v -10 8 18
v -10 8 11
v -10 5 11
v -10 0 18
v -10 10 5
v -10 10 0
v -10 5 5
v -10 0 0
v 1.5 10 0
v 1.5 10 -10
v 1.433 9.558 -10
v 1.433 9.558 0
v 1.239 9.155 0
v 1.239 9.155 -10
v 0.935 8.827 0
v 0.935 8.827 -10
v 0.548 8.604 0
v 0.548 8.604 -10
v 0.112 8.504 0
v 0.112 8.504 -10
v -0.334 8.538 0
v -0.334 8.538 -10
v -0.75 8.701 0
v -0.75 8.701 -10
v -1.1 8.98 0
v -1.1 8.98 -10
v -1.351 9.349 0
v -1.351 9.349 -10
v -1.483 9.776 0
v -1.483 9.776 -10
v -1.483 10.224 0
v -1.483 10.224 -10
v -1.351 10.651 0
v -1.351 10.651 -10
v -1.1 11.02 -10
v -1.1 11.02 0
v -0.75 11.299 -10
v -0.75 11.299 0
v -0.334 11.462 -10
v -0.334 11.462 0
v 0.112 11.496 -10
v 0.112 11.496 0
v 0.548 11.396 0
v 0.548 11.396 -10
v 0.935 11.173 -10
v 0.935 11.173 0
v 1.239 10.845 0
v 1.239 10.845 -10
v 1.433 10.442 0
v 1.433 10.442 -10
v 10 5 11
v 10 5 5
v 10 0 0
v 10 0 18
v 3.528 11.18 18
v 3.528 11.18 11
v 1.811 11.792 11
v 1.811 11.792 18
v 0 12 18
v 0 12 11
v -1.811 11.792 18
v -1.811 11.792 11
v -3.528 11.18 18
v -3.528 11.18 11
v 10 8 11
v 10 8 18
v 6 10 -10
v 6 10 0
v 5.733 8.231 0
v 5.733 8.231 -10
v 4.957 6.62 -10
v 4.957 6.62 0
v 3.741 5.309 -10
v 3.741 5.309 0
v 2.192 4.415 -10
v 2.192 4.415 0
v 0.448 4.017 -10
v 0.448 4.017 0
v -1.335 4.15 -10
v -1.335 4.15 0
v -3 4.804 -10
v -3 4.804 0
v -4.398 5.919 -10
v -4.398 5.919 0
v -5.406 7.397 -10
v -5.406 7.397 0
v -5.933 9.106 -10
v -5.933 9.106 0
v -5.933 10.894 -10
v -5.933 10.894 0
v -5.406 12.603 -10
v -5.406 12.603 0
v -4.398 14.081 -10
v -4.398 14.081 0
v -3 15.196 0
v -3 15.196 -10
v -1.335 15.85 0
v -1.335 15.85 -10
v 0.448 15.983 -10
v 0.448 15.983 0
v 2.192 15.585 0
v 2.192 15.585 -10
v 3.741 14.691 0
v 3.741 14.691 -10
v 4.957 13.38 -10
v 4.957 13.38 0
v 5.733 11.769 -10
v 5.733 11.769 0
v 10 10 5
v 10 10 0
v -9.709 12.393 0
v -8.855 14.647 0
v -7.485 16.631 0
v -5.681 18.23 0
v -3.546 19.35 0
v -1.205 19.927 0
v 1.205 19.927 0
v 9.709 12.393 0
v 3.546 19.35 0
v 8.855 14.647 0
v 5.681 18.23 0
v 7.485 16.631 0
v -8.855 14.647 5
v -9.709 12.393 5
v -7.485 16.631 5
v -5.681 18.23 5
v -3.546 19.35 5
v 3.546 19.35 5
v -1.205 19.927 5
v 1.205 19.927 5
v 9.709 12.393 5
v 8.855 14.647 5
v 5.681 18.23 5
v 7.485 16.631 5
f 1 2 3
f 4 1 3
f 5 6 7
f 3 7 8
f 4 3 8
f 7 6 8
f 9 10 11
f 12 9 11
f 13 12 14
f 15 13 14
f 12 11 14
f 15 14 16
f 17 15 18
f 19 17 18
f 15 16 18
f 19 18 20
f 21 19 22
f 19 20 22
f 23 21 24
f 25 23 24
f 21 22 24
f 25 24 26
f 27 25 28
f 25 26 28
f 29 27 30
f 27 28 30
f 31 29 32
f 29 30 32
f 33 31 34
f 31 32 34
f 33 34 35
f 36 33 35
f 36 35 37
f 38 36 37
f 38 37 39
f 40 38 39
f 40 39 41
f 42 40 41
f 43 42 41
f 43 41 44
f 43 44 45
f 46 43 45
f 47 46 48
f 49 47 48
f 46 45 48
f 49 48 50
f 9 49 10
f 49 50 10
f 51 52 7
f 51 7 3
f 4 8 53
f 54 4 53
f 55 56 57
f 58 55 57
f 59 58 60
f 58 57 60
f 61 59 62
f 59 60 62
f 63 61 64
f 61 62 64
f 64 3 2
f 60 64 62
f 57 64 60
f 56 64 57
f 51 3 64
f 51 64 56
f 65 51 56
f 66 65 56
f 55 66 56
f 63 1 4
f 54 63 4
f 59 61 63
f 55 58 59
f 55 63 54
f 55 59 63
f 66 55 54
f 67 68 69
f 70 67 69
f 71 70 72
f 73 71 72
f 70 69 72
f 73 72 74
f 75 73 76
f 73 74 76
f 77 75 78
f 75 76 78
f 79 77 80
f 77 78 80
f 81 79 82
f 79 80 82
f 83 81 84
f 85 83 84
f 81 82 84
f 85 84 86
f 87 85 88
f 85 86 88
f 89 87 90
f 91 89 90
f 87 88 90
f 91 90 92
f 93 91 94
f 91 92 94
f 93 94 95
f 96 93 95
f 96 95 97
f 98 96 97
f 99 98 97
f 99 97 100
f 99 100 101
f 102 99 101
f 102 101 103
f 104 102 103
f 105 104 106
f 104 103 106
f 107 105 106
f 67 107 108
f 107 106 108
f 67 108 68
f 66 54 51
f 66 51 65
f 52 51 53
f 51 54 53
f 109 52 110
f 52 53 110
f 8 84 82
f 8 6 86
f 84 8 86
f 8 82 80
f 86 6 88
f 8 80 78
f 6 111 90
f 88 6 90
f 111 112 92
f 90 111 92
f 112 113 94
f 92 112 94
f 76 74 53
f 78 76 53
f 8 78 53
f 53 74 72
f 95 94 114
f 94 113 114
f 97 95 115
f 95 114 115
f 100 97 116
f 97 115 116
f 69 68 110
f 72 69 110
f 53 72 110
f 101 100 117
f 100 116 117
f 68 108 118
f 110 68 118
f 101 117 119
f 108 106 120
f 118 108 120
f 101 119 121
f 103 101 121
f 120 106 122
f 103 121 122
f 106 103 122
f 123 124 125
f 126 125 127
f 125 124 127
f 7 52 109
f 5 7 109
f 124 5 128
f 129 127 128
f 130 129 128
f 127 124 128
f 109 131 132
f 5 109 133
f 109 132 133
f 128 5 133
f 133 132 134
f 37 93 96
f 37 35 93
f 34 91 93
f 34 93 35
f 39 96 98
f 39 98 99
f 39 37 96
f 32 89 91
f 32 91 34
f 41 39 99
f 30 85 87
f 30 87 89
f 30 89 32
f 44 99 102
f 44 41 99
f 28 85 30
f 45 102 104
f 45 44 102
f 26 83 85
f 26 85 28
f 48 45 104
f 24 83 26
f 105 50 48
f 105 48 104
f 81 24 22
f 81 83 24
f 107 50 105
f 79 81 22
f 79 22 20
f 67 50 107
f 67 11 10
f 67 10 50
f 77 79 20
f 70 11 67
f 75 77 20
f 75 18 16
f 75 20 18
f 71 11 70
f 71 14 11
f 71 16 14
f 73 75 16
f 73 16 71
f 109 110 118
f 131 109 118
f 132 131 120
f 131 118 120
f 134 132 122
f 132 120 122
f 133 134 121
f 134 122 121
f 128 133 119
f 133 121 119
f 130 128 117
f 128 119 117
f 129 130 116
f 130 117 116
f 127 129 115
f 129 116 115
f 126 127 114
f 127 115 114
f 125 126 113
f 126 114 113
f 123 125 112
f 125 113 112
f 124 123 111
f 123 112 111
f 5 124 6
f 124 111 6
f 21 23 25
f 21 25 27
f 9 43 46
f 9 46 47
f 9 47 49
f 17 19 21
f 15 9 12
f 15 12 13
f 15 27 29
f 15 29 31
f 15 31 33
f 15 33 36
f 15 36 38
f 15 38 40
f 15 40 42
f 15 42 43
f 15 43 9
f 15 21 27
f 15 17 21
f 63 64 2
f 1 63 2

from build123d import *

# Parameters (mm, degrees)
PAD_DEPTH         = 18
PAD001_DEPTH      = 5
SKETCH002_W       = 13.704409
SKETCH002_H       = 6
POCKET_DEPTH      = 10.001
POCKET_DEPTH_BACK = -10.001
SKETCH003_R       = 6
PAD002_DEPTH      = 10
SKETCH004_R       = 1.5
POCKET001_DEPTH   = 10


with BuildPart() as part:
    # Sketch → Pad (new body)
    with BuildSketch(Plane.XY):
        with BuildLine():
            Line((-10, 0), (10, 0))
            Line((10, 0), (10, 8))
            Line((10, 8), (3.527972, 11.180071))
            ThreePointArc((3.527972, 11.180071), (0, 12), (-3.527972, 11.180071))
            Line((-3.527972, 11.180071), (-10, 8))
            Line((-10, 8), (-10, 0))
        make_face()
    extrude(amount=PAD_DEPTH)

    # Sketch001 → Pad001 (join)
    with BuildSketch(Plane.XY):
        with BuildLine():
            Line((-10, 0), (10, 0))
            Line((10, 0), (10, 10))
            ThreePointArc((10, 10), (0, 20), (-10, 10))
            Line((-10, 10), (-10, 0))
        make_face()
    extrude(amount=PAD001_DEPTH)

    # Sketch002 → Pocket (cut, two sides)
    with BuildSketch(Plane.YZ) as pocket_sk:
        with Locations((11.852204, 8)):
            Rectangle(SKETCH002_W, SKETCH002_H)
    extrude(amount=-POCKET_DEPTH, mode=Mode.SUBTRACT)
    extrude(pocket_sk.sketch, amount=-POCKET_DEPTH_BACK, mode=Mode.SUBTRACT)

    # Sketch003 (on Face4 of Pocket) → Pad002 (join)
    with BuildSketch(Plane(origin=(0, 0, 0), x_dir=(1, 0, 0), z_dir=(0, 0, -1))):
        with Locations((0, -10)):
            Circle(SKETCH003_R)
    extrude(amount=PAD002_DEPTH)

    # Sketch004 (on Face14 of Pad002) → Pocket001 (cut)
    with BuildSketch(Plane(origin=(0, 0, -10), x_dir=(1, 0, 0), z_dir=(0, 0, -1))):
        with Locations((0, -10)):
            Circle(SKETCH004_R)
    extrude(amount=-POCKET001_DEPTH, mode=Mode.SUBTRACT)


solid = part.part
